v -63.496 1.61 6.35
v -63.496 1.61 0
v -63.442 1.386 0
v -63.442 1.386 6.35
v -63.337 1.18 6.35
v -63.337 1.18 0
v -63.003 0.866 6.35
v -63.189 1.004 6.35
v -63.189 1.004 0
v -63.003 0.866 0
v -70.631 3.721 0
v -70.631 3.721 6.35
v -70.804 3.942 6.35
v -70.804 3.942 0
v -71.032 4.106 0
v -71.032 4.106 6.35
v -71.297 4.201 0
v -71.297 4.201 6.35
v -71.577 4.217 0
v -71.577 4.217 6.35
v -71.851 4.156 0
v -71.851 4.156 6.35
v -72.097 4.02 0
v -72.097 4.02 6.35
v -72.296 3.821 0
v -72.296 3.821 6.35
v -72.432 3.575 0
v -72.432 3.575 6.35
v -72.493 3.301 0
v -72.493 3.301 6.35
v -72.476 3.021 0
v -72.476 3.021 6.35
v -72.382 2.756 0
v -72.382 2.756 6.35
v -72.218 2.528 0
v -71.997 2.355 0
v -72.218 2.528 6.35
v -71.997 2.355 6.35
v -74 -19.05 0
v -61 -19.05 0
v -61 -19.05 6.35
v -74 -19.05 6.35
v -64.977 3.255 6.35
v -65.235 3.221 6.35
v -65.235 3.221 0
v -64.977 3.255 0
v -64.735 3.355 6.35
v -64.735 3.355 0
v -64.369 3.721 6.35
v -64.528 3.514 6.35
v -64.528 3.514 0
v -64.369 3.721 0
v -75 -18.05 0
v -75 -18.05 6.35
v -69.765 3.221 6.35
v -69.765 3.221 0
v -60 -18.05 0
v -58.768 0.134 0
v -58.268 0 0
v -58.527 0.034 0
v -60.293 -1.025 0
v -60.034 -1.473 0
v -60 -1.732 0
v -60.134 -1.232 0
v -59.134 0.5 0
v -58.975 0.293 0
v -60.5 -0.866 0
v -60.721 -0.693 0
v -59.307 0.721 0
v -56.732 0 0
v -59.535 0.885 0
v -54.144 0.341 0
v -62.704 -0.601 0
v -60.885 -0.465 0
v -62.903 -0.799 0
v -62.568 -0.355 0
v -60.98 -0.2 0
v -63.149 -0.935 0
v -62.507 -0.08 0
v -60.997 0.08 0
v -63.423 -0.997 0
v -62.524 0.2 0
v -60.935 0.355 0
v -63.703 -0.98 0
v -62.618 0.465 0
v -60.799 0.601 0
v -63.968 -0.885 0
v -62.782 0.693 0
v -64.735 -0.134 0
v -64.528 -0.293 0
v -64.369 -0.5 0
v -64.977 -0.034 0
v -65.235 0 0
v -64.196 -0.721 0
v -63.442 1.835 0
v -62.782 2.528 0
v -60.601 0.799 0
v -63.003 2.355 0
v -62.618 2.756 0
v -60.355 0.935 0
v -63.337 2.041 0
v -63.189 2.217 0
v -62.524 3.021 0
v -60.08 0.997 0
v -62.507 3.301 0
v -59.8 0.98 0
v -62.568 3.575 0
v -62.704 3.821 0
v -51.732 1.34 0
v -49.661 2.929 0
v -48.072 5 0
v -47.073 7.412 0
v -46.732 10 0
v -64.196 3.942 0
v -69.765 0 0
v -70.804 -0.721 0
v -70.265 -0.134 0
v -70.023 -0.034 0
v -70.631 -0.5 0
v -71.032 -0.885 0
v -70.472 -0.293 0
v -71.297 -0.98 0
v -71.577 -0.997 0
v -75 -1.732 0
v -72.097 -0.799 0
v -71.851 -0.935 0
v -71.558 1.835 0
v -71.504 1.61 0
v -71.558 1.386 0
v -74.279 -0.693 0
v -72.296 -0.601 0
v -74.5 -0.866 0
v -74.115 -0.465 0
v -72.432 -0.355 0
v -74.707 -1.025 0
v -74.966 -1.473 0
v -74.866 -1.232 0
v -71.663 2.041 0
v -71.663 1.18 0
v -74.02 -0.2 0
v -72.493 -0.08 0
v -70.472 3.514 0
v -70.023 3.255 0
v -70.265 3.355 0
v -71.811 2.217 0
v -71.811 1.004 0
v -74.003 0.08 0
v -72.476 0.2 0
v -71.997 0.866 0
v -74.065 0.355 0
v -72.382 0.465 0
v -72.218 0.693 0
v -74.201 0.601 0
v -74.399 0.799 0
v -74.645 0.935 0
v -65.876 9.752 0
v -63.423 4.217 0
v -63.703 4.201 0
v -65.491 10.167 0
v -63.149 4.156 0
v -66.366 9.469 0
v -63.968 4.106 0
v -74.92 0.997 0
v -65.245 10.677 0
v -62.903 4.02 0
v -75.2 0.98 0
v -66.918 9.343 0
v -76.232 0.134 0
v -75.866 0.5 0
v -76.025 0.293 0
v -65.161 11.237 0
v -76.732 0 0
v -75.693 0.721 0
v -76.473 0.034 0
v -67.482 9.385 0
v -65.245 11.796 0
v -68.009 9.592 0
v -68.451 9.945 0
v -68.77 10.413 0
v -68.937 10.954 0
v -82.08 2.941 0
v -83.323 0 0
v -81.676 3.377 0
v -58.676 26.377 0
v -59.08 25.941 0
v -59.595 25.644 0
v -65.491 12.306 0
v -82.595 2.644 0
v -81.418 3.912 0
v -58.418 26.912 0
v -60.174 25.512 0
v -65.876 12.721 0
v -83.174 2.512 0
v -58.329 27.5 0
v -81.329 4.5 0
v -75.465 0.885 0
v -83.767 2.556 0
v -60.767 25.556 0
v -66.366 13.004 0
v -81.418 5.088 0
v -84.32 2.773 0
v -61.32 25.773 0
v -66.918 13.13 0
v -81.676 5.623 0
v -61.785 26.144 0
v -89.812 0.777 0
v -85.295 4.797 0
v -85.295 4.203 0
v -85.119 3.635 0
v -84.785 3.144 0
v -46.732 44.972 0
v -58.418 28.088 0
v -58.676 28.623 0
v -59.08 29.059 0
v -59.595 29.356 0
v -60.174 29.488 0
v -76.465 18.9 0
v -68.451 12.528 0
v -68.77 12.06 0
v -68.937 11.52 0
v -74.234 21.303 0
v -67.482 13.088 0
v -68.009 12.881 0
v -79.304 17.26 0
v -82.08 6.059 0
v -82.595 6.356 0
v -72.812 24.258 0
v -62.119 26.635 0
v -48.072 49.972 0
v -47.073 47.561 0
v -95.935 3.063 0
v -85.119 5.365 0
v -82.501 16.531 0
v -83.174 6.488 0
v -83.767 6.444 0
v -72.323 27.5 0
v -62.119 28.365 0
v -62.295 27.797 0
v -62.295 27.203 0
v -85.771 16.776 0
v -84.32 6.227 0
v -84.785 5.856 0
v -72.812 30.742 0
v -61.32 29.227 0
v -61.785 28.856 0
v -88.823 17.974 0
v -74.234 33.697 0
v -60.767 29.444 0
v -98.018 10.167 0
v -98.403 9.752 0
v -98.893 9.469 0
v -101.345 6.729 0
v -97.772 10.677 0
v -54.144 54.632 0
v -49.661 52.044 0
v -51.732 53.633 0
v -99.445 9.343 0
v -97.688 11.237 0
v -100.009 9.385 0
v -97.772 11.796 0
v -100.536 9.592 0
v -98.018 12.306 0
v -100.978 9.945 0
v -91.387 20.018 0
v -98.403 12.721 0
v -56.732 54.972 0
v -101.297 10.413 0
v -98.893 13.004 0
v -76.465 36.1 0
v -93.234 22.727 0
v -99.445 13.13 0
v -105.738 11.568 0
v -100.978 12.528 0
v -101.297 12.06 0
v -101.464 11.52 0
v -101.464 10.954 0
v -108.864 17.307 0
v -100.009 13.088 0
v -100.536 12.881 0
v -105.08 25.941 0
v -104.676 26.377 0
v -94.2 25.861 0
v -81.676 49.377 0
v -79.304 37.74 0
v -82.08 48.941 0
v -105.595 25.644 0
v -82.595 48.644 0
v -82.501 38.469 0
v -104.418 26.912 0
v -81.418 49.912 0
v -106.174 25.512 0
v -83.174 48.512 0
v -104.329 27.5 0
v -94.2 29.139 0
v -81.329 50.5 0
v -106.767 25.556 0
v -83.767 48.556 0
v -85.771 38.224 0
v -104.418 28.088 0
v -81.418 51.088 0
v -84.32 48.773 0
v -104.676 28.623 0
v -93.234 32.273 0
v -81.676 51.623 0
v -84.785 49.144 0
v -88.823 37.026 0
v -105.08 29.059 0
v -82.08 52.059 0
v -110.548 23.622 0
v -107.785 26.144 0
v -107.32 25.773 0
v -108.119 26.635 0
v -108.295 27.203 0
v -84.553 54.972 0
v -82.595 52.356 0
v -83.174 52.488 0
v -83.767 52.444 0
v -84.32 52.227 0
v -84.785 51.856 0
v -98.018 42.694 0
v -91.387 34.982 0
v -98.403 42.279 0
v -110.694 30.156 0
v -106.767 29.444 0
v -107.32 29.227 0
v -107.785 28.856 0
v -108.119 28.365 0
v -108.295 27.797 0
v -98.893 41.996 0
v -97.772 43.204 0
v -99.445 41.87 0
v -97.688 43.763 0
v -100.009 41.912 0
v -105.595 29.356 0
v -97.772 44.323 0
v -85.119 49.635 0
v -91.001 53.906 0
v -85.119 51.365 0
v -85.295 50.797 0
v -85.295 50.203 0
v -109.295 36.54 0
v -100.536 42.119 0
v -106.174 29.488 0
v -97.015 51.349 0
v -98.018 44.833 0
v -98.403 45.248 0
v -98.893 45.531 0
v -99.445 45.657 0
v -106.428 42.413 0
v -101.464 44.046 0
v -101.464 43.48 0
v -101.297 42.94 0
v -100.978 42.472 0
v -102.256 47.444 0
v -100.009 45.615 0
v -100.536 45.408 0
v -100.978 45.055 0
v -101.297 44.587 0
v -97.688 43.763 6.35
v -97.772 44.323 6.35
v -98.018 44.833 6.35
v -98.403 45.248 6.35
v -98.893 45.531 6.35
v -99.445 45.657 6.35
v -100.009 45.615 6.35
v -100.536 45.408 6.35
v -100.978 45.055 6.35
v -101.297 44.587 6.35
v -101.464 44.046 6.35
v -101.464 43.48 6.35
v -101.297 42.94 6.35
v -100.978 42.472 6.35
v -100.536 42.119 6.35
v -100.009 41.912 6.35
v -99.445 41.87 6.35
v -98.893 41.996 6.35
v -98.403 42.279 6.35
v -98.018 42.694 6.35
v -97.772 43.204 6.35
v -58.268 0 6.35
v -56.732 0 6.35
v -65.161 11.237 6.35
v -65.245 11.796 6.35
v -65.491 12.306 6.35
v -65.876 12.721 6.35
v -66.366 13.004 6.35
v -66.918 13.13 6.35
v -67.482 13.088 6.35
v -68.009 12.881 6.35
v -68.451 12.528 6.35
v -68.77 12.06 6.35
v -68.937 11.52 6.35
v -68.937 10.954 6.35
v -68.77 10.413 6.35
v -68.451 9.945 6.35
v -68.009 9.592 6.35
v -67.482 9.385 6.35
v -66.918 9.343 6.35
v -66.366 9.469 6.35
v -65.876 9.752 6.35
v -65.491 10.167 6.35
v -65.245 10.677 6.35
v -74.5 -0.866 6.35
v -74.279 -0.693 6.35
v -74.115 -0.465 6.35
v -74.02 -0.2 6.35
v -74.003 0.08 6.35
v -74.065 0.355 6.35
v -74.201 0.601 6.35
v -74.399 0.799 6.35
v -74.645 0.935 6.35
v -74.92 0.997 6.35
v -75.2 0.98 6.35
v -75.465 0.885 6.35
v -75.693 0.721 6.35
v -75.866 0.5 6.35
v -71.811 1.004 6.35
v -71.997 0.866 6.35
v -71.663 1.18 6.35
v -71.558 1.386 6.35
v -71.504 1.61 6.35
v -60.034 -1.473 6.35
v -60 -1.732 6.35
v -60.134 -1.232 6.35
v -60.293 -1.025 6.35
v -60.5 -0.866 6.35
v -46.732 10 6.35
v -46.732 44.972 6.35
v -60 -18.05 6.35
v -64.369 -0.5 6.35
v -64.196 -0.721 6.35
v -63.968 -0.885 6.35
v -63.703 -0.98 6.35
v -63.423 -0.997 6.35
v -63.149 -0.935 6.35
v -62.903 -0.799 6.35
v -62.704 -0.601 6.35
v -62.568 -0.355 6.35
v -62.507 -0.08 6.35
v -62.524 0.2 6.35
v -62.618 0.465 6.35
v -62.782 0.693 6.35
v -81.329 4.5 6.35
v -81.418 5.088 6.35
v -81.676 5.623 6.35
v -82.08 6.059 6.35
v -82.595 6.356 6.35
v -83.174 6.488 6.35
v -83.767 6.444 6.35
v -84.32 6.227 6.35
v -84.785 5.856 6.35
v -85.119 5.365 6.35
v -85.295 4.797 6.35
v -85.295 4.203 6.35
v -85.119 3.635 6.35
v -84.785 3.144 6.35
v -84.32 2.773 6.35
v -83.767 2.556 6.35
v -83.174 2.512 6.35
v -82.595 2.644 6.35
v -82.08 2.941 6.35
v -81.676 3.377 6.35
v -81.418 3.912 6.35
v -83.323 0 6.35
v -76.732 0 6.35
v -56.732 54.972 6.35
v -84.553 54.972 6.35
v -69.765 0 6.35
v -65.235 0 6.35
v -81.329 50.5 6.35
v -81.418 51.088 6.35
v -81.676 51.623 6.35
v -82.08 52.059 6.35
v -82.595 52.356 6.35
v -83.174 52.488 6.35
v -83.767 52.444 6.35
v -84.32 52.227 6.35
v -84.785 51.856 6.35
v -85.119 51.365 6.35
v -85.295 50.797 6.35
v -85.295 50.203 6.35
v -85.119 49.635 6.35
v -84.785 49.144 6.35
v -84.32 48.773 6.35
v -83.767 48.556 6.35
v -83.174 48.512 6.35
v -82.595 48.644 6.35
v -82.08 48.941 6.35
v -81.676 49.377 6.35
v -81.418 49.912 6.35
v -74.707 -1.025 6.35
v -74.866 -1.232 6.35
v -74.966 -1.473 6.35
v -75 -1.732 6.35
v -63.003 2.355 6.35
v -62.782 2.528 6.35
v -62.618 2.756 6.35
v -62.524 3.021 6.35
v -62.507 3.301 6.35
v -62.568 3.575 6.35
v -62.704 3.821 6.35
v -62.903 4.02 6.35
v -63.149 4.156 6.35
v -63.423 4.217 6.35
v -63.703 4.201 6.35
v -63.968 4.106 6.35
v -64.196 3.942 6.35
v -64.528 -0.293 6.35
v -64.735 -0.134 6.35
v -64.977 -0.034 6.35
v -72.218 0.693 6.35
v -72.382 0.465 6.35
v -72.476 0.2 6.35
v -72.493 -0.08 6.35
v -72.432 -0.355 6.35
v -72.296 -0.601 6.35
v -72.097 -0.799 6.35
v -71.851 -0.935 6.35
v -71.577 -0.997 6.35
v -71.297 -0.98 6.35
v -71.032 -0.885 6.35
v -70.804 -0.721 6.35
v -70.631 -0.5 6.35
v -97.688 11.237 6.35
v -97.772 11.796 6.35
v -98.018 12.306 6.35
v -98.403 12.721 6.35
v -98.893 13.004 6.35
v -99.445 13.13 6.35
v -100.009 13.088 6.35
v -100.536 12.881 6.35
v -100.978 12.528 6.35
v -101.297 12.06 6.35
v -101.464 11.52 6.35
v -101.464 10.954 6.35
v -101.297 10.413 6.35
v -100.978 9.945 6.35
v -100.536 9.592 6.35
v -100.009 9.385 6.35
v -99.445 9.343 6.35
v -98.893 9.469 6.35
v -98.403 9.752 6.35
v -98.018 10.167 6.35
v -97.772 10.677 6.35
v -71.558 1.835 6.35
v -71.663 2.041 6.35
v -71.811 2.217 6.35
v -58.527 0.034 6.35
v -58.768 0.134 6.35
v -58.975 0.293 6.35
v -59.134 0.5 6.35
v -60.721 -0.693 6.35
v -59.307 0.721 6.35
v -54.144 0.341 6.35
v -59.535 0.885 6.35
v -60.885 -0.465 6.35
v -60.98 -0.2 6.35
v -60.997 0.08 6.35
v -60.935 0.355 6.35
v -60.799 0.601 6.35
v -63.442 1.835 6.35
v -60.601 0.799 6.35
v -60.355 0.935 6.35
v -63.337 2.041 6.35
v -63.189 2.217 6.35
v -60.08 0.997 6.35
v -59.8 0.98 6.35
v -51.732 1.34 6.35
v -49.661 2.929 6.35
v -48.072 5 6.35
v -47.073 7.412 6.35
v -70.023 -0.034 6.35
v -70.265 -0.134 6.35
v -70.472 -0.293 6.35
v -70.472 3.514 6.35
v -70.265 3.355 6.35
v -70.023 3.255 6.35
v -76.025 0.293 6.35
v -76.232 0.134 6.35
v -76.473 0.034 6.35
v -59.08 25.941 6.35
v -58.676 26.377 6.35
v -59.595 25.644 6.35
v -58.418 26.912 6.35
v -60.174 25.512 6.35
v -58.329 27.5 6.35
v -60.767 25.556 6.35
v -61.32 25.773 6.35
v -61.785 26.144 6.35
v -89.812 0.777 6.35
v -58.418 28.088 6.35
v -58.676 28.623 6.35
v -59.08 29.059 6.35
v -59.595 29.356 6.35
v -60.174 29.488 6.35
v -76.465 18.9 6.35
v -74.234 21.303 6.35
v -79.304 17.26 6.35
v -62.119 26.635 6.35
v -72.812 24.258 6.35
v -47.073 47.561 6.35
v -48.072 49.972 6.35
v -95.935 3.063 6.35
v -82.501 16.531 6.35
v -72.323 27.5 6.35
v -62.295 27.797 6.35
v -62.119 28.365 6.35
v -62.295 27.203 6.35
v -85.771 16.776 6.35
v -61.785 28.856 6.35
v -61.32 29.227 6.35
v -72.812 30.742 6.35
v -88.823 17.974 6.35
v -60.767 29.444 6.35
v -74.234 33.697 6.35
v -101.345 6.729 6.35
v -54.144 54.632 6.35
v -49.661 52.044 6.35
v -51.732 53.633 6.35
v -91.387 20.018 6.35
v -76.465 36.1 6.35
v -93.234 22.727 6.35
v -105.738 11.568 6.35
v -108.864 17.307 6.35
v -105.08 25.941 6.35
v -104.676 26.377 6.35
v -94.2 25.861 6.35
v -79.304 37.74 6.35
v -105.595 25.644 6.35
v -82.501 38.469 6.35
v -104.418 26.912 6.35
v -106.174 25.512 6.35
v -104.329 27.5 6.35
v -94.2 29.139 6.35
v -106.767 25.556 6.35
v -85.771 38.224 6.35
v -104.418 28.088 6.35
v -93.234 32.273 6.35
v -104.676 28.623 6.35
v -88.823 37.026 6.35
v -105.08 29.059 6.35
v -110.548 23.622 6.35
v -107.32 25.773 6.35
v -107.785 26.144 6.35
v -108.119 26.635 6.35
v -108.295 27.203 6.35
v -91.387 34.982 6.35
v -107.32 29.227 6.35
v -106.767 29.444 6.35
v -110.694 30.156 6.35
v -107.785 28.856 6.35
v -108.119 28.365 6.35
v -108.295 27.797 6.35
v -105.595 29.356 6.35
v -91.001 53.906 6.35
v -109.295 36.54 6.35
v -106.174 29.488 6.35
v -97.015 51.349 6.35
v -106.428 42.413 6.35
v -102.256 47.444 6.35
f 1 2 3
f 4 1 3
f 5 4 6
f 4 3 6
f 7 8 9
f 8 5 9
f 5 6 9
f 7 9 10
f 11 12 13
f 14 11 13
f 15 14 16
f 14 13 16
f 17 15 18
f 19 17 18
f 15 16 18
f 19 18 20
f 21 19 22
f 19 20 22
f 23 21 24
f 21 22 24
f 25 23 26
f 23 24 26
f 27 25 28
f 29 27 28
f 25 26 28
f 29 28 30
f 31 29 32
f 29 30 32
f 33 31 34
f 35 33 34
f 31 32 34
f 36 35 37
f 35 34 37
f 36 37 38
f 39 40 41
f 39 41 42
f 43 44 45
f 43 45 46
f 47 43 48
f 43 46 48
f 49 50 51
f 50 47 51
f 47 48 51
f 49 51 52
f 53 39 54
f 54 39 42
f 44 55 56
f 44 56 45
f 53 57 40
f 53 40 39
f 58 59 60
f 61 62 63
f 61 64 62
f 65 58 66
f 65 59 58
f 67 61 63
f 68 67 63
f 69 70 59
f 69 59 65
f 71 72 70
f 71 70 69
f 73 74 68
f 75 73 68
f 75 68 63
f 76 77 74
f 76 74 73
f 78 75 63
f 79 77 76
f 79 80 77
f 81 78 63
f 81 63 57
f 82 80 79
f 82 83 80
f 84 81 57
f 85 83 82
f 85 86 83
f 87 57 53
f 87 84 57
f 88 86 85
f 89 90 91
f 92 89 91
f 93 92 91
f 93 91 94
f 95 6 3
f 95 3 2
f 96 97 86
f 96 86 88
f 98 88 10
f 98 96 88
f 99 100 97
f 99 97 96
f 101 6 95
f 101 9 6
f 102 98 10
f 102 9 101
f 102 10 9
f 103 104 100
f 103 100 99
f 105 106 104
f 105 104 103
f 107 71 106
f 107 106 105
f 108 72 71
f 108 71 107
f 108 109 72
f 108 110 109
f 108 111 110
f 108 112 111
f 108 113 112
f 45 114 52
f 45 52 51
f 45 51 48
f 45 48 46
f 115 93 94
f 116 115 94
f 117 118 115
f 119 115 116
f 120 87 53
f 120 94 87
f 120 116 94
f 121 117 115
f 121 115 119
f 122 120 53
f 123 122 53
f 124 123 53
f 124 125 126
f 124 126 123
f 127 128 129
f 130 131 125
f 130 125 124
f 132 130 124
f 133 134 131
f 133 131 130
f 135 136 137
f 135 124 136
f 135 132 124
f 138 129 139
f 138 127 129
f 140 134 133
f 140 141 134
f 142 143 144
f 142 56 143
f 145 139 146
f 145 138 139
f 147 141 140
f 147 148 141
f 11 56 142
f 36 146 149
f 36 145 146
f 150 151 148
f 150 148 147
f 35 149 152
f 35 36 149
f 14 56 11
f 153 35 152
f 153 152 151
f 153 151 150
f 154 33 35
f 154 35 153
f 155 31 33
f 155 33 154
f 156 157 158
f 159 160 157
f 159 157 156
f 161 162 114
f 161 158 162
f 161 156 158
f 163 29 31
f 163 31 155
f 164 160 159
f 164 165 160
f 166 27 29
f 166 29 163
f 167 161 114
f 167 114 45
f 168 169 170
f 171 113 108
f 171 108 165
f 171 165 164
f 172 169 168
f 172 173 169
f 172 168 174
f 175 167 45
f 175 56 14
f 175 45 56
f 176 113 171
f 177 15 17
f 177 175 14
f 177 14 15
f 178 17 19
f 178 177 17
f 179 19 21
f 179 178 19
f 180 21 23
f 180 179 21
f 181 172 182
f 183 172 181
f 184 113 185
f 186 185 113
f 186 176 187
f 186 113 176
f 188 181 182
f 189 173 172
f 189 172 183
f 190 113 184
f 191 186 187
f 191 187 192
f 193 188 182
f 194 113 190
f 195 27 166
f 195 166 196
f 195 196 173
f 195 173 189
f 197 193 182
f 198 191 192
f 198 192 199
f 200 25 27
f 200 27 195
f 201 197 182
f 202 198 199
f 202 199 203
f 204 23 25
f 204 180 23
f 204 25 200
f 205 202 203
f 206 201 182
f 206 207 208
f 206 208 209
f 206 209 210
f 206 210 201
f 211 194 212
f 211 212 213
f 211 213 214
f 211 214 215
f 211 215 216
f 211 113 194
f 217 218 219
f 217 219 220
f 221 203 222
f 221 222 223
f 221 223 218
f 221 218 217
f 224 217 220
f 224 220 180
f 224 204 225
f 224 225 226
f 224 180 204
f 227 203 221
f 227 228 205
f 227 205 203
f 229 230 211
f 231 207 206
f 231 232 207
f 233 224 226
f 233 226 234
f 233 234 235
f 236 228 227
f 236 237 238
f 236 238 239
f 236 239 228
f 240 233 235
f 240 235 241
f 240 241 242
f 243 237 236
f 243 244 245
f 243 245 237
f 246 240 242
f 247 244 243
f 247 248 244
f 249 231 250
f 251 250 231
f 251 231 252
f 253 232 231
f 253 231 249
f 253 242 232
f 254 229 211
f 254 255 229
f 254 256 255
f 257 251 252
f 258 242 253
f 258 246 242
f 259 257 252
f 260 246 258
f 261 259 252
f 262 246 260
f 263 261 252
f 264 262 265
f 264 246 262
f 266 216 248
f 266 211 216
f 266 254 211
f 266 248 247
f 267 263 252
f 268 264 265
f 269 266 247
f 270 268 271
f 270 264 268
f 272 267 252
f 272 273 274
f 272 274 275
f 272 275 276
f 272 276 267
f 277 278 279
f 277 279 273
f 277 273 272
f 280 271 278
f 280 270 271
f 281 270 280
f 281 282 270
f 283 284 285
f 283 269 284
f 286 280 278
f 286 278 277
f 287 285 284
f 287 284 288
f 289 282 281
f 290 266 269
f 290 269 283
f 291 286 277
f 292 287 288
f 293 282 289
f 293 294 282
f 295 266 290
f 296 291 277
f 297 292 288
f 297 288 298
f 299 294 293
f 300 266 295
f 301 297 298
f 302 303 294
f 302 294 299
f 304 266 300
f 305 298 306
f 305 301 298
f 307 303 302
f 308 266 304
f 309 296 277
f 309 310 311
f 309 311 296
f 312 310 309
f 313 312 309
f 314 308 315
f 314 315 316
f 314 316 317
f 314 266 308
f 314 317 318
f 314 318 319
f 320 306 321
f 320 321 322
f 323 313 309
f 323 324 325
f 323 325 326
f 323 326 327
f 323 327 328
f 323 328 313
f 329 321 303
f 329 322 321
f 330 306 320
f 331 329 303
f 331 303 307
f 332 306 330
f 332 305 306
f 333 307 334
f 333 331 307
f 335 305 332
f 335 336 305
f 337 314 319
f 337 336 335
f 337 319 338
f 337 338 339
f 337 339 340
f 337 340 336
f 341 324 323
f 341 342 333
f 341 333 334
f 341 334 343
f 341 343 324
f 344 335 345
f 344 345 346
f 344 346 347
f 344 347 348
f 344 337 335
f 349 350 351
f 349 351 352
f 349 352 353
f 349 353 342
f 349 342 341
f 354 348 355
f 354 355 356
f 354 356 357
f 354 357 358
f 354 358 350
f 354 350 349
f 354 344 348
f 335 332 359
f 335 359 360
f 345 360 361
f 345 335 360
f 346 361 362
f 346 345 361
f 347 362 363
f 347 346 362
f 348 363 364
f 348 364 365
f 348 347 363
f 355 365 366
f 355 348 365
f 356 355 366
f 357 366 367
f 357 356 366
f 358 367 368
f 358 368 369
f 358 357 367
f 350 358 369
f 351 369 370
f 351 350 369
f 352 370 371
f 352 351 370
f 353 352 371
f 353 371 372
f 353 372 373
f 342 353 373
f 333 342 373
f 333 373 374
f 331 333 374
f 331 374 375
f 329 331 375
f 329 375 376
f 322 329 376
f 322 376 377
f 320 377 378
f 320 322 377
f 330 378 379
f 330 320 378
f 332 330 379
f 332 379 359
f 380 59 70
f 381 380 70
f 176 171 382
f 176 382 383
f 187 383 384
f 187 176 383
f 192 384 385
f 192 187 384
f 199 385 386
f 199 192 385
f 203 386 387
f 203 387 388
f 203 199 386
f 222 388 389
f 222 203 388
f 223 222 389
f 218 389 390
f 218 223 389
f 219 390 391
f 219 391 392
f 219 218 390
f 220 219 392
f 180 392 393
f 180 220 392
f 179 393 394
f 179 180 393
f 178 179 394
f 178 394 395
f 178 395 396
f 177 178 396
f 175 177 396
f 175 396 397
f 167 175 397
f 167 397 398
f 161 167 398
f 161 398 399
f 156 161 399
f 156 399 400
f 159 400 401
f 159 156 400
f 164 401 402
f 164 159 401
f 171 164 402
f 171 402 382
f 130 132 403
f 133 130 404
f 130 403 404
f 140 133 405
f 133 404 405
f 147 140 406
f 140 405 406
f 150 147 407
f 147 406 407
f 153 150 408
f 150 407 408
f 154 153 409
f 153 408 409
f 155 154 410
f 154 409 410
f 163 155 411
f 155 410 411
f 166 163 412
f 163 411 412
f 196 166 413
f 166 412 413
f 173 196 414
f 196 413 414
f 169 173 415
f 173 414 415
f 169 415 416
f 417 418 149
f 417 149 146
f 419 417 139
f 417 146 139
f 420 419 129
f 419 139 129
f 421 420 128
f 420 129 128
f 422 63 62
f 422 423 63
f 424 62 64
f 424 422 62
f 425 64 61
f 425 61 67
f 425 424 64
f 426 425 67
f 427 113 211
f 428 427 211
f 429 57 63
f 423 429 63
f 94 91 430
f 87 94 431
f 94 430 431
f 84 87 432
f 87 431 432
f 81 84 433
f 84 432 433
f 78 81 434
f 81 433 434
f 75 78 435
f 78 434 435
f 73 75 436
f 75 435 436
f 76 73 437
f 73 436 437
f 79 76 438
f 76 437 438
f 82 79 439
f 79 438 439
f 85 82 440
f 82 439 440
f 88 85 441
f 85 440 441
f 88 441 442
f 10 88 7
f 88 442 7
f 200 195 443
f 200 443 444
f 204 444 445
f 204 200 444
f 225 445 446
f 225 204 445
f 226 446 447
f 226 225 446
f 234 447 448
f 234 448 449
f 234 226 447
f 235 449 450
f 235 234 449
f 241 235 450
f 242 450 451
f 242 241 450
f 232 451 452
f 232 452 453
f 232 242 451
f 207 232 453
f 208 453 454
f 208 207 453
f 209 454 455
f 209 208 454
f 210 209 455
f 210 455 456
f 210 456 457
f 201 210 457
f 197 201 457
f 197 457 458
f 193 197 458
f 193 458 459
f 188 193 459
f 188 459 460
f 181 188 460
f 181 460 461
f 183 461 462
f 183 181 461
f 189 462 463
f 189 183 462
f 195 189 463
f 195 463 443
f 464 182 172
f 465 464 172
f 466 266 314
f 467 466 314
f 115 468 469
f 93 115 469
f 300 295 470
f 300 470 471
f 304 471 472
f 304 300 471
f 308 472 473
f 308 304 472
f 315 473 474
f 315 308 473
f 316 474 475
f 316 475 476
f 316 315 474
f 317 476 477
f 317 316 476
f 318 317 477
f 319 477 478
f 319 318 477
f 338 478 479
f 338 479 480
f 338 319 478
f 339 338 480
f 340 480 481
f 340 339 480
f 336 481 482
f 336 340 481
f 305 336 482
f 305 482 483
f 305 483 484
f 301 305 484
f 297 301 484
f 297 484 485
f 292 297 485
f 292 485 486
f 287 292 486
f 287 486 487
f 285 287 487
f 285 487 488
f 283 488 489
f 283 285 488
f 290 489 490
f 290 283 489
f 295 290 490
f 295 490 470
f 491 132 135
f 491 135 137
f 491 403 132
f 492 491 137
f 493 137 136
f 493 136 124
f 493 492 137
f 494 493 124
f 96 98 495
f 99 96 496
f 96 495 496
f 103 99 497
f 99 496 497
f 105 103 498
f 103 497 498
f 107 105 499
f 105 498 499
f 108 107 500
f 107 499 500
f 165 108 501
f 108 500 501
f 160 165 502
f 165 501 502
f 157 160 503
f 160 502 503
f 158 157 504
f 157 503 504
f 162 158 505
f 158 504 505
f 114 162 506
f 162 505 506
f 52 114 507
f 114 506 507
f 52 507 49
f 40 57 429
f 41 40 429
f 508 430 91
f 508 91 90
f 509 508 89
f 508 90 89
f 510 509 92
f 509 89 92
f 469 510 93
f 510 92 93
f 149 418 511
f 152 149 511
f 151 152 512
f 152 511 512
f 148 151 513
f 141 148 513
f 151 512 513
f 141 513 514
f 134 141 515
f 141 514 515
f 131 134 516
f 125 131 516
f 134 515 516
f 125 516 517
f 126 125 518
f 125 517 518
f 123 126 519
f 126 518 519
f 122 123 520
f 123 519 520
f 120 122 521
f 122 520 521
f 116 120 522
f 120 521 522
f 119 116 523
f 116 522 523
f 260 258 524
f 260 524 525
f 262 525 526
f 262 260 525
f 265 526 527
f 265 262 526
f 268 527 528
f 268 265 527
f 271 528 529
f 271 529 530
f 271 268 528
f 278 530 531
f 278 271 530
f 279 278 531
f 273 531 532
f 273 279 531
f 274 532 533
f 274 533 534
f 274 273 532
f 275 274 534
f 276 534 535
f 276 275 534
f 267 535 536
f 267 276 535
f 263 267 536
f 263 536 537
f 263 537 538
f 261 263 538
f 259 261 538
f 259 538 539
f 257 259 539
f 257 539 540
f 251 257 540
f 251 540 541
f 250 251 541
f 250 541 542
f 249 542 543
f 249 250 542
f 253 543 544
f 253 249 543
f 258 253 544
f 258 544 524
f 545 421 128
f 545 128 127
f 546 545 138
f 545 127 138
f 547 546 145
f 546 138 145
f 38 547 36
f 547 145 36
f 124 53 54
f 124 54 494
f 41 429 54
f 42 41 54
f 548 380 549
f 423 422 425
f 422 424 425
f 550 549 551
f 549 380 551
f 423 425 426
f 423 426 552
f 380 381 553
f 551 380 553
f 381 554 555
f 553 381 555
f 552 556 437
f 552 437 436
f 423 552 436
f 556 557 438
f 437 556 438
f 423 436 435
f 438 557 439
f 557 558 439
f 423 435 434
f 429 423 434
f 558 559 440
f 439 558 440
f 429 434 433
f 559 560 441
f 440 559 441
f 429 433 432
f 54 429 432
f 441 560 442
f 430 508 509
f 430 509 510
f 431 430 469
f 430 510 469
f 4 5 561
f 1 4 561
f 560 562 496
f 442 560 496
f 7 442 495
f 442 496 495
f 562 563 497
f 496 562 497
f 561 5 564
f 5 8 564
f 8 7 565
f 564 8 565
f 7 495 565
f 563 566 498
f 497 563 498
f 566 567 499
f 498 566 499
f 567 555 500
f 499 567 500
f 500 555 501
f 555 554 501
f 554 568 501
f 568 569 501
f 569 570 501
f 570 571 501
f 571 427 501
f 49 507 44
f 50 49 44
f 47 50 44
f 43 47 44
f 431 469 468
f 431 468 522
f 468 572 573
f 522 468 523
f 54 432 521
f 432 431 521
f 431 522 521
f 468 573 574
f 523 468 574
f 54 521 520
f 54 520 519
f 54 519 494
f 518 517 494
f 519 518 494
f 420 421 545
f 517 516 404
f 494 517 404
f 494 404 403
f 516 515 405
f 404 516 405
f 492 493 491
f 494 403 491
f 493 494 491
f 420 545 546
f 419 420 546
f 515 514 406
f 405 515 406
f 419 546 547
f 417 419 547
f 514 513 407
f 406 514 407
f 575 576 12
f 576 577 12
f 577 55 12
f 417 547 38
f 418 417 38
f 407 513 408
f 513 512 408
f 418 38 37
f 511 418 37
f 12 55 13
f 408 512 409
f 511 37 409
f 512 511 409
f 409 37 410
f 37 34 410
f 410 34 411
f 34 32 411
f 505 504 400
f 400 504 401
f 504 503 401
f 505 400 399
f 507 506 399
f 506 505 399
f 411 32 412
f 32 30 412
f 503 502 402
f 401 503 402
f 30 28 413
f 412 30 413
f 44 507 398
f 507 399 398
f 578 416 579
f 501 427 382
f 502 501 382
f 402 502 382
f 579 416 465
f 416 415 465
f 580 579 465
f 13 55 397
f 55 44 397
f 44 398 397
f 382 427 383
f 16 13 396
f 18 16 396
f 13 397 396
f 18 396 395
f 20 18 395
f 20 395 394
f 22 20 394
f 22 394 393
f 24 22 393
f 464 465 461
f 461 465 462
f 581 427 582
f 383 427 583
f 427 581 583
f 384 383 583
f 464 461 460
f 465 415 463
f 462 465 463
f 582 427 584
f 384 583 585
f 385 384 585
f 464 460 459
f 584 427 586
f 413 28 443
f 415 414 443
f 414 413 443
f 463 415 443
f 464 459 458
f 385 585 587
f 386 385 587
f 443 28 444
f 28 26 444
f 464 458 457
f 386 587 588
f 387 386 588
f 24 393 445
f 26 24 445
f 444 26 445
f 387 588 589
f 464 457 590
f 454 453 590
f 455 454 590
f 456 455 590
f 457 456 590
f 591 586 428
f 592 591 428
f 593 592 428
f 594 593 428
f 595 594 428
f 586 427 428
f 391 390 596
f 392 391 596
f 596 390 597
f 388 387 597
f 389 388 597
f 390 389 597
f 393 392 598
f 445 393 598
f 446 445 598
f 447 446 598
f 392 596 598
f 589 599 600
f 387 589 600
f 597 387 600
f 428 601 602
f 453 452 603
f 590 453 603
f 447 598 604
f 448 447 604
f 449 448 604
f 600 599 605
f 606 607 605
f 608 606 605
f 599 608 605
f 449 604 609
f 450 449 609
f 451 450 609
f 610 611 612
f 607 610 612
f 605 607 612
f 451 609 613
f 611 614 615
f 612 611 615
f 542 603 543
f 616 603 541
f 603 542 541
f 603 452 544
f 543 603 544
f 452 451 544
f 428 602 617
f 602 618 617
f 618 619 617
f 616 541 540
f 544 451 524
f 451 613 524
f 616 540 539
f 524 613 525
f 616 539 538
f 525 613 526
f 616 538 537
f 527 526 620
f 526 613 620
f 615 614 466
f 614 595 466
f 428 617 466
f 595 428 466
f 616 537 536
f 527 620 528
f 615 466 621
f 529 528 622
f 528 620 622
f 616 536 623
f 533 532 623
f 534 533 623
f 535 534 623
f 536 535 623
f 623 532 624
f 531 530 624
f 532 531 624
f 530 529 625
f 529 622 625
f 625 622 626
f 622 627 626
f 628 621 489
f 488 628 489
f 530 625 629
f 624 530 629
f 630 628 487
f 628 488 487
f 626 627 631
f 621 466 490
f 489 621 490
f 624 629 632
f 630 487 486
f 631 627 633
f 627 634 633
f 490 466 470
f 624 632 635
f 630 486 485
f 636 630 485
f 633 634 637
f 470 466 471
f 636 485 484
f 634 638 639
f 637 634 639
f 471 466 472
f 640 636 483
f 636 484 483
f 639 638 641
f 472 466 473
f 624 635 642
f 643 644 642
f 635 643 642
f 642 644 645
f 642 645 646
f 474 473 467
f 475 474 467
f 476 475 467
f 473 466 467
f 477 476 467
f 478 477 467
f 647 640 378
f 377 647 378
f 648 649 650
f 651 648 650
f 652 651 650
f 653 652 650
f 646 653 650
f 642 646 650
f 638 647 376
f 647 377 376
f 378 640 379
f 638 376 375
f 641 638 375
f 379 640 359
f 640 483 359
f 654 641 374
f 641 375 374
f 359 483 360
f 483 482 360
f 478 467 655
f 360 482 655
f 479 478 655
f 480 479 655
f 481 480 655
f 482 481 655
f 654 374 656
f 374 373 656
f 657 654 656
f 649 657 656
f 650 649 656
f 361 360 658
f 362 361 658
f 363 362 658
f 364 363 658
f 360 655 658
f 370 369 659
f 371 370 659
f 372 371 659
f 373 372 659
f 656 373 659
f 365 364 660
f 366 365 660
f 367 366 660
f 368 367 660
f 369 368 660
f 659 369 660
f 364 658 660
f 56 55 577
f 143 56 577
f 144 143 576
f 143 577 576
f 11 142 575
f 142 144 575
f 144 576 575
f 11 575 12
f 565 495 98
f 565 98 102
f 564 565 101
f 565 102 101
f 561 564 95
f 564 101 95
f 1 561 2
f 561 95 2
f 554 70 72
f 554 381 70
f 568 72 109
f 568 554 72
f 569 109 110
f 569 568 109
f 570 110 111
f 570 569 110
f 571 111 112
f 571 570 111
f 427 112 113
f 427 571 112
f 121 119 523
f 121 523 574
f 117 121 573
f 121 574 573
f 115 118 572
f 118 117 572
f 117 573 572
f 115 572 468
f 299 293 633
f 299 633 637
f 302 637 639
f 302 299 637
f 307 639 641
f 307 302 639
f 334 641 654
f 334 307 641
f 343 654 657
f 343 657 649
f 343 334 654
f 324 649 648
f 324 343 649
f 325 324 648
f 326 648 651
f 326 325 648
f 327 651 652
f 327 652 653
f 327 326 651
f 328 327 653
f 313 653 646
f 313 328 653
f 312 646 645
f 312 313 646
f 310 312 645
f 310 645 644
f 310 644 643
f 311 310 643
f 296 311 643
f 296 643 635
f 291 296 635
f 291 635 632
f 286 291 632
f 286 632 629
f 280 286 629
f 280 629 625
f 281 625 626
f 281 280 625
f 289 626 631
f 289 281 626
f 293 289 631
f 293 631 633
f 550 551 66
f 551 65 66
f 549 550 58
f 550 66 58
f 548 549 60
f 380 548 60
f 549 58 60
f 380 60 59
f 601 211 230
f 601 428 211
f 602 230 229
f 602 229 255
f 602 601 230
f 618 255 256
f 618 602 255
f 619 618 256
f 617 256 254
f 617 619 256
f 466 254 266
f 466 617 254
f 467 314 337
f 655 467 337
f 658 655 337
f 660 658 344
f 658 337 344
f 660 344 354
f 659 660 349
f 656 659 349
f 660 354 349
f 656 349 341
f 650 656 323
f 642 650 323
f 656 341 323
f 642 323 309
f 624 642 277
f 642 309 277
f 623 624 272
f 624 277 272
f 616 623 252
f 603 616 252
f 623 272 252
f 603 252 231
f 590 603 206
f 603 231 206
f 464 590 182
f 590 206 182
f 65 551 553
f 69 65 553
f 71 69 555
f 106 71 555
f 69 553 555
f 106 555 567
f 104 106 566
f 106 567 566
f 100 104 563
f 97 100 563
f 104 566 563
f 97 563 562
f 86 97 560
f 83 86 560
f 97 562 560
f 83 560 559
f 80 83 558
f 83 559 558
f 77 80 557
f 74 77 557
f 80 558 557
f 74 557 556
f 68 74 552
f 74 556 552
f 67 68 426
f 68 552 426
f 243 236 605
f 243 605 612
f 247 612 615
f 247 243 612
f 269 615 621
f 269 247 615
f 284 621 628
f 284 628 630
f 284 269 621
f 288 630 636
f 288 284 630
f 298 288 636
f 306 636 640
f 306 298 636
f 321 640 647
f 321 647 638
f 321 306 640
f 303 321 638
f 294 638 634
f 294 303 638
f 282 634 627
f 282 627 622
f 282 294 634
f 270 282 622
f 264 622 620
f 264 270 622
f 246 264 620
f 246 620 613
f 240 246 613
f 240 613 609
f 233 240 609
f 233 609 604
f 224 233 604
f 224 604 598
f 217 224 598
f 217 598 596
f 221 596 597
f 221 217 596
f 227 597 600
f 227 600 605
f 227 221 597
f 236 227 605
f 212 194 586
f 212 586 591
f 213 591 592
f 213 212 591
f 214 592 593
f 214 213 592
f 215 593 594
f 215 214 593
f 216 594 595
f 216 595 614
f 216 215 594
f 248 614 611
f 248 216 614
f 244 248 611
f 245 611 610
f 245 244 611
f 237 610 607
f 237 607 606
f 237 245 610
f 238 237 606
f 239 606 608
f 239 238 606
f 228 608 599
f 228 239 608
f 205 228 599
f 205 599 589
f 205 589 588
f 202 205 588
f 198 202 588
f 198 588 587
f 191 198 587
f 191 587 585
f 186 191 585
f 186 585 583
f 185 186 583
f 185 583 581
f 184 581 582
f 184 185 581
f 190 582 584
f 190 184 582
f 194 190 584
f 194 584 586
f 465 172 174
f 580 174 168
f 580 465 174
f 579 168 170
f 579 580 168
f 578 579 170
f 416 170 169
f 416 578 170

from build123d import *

# Parameters (mm, degrees)
SKETCH1_R           = 11
SKETCH1_R_2         = 1.89865
SKETCH1_R_3         = 1.9939
BOSS_EXTRUDE1_DEPTH = 6.35
FILLET1_R           = 10
SKETCH2_W           = 15
SKETCH2_H           = 19.05
BOSS_EXTRUDE2_DEPTH = 6.35
CHAMFER1_SIZE       = 1
SKETCH3_R           = 1
CUT_EXTRUDE1_DEPTH  = 159.045298363
SKETCH4_W           = 7.99338
SKETCH4_H           = 3.22072
CUT_EXTRUDE2_DEPTH  = 159.045298363
FILLET3_R           = 1
CUT_EXTRUDE3_DEPTH  = 159.045298363
FILLET4_R           = 10
SKETCH9_R           = 1
CUT_EXTRUDE4_DEPTH  = 124.871065449
FILLET5_R           = 1


with BuildPart() as part:
    # Sketch1 → Boss-Extrude1 (new body)
    with BuildSketch(Plane.XY):
        with BuildLine():
            Line((-40.498784978, 0), (0, 0))
            Line((0, 0), (0, 75))
            ThreePointArc((0, 75), (-37.5, 112.5), (-75, 75))
            Line((-75, 75), (-75, 55))
            Line((-75, 55), (-83.323029145, 55))
            ThreePointArc((-83.323029145, 55), (-110.823029145, 27.5), (-83.323029145, 0))
            Line((-83.323029145, 0), (-40.498784978, 0))
        make_face()
        with Locations((-83.323029145, 27.5)):
            Circle(SKETCH1_R, mode=Mode.SUBTRACT)
        with Locations((-67.059573177, 11.236544033)):
            Circle(SKETCH1_R_2, mode=Mode.SUBTRACT)
        with Locations((-83.323029145, 50.5)):
            Circle(SKETCH1_R_3, mode=Mode.SUBTRACT)
        with Locations((-99.586485112, 11.236544033)):
            Circle(SKETCH1_R_2, mode=Mode.SUBTRACT)
        with Locations((-60.323029145, 27.5)):
            Circle(SKETCH1_R_3, mode=Mode.SUBTRACT)
        with Locations((-99.586485112, 43.763455967)):
            Circle(SKETCH1_R_2, mode=Mode.SUBTRACT)
        with Locations((-83.323029145, 4.5)):
            Circle(SKETCH1_R_3, mode=Mode.SUBTRACT)
        with Locations((-106.323029145, 27.5)):
            Circle(SKETCH1_R_3, mode=Mode.SUBTRACT)
    extrude(amount=BOSS_EXTRUDE1_DEPTH)

    # Fillet1
    fillet1_edges = [part.edges().sort_by_distance(p)[0] for p in [
        (-75, 55, 3.175),
    ]]
    fillet(fillet1_edges, radius=FILLET1_R)

    # Sketch2 → Boss-Extrude2 (add)
    with BuildSketch(Plane(origin=(0, 0, 0), x_dir=(-1, 0, 0), z_dir=(0, 0, -1))):
        with Locations((7.5, -9.525)):
            Rectangle(SKETCH2_W, SKETCH2_H)
        with Locations((37.5, -9.525)):
            Rectangle(SKETCH2_W, SKETCH2_H)
        with Locations((67.5, -9.525)):
            Rectangle(SKETCH2_W, SKETCH2_H)
    extrude(amount=-BOSS_EXTRUDE2_DEPTH)

    # Chamfer1
    chamfer1_edges = [part.edges().sort_by_distance(p)[0] for p in [
        (0, -19.05, 3.175),
        (-15, -19.05, 3.175),
        (-30, -19.05, 3.175),
        (-45, -19.05, 3.175),
        (-60, -19.05, 3.175),
        (-75, -19.05, 3.175),
    ]]
    chamfer(chamfer1_edges, length=CHAMFER1_SIZE)

    # Sketch3 → Cut-Extrude1 (cut, through all)
    with BuildSketch(Plane.XY.offset(6.35)):
        with Locations((-75, 0)):
            Circle(SKETCH3_R)
        with Locations((-60, 0)):
            Circle(SKETCH3_R)
        with Locations((-45, 0)):
            Circle(SKETCH3_R)
        with Locations((-30, 0)):
            Circle(SKETCH3_R)
        with Locations((-15, 0)):
            Circle(SKETCH3_R)
    extrude(amount=-CUT_EXTRUDE1_DEPTH, mode=Mode.SUBTRACT)

    # Sketch4 → Cut-Extrude2 (cut, through all)
    with BuildSketch(Plane.XY.offset(6.35)):
        with Locations((-67.5, 1.61036)):
            Rectangle(SKETCH4_W, SKETCH4_H)
    extrude(amount=-CUT_EXTRUDE2_DEPTH, mode=Mode.SUBTRACT)

    # Fillet3
    fillet3_edges = [part.edges().sort_by_distance(p)[0] for p in [
        (-75, -1, 3.175),
        (-76, 0, 3.175),
        (-60, -1, 3.175),
        (-59, 0, 3.175),
        (-45, -1, 3.175),
        (-46, 0, 3.175),
        (-30, -1, 3.175),
        (-29, 0, 3.175),
        (-15, -1, 3.175),
        (-16, 0, 3.175),
    ]]
    fillet(fillet3_edges, radius=FILLET3_R)

    # Sketch5 → Cut-Extrude3 (cut, through all)
    with BuildSketch(Plane(origin=(0, 0, 0), x_dir=(-1, 0, 0), z_dir=(0, 0, -1))):
        Polygon((46.732050808, 0), (46.732050808, 54.972488867), (84.552807772, 54.972488867), (84.552807772, 112.5), (0, 112.5), (0, -19.05), (46.732050808, -19.05), align=None)
    extrude(amount=-CUT_EXTRUDE3_DEPTH, mode=Mode.SUBTRACT)

    # Fillet4
    fillet4_edges = [part.edges().sort_by_distance(p)[0] for p in [
        (-46.732050808, 0, 3.175),
        (-46.732050808, 54.972488867, 3.175),
    ]]
    fillet(fillet4_edges, radius=FILLET4_R)

    # Sketch9 → Cut-Extrude4 (cut, through all)
    with BuildSketch(Plane.XY.offset(6.35)):
        with Locations((-71.49669, 3.22072)):
            Circle(SKETCH9_R)
        with Locations((-63.50331, 3.22072)):
            Circle(SKETCH9_R)
        with Locations((-63.50331, 0)):
            Circle(SKETCH9_R)
        with Locations((-71.49669, 0)):
            Circle(SKETCH9_R)
    extrude(amount=-CUT_EXTRUDE4_DEPTH, mode=Mode.SUBTRACT)

    # Fillet5
    # the kernel refuses this fillet: 1 mm, written as the material it takes off along each edge
    with BuildSketch(Plane(origin=(-64.50331, 3.22072, -1.830127019), x_dir=(0.2588190451025049, 0.9659258262890725, 0), z_dir=(0, 0, 1)), Plane(origin=(-63.50331, 1, -1.830127019), x_dir=(0.9659258262890688, -0.25881904510251885, 0), z_dir=(0, 0, 1)), Plane(origin=(-71.49669, 2.22072, -1.830127019), x_dir=(-0.9659258262890682, 0.25881904510252124, 0), z_dir=(0, 0, 1))) as fillet5_piece_1:
        with BuildLine():
            CenterArc((0.776457135, 0.965925826), FILLET5_R, 195, 60)
            Line((-0.189468691, 0.707106781), (0, 0))
            ThreePointArc((0, 0), (0.258819045, 0.034074174), (0.51763809, 0))
        make_face()
    extrude(amount=10.010254038, mode=Mode.SUBTRACT)
    with BuildSketch(Plane(origin=(-63.50331, 2.22072, -1.830127019), x_dir=(0, -1, 0), z_dir=(0, 0, 1)), Plane(origin=(-71.49669, 1, -1.830127019), x_dir=(0, 1, 0), z_dir=(0, 0, 1))) as fillet5_piece_2:
        with BuildLine():
            CenterArc((0.732050808, 1), FILLET5_R, 210, 60)
            ThreePointArc((-0.133974596, 0.5), (-0.034074174, 0.258819045), (0, 0))
            Line((0, 0), (0.732050808, 0))
        make_face()
    extrude(amount=10.010254038, mode=Mode.SUBTRACT)
    with BuildSketch(Plane(origin=(-64.50331, 0, -1.830127019), x_dir=(0.2588190451025049, -0.9659258262890725, 0), z_dir=(0, 0, 1)), Plane(origin=(-70.49669, 0, 8.180127019), x_dir=(-0.25881904510253045, -0.9659258262890658, 0), z_dir=(0, 0, -1))) as fillet5_piece_3:
        with BuildLine():
            CenterArc((0.776457135, -0.965925826), FILLET5_R, 105, 60)
            Line((-0.189468691, -0.707106781), (0, 0))
            ThreePointArc((0, 0), (0.258819045, -0.034074174), (0.51763809, 0))
        make_face()
    extrude(amount=10.010254038, mode=Mode.SUBTRACT)
    with BuildSketch(Plane(origin=(-70.49669, 3.22072, 8.180127019), x_dir=(1, 0, 0), z_dir=(0, 0, -1))) as fillet5_piece_4:
        with BuildLine():
            CenterArc((0.732050808, -1), FILLET5_R, 90, 60)
            ThreePointArc((-0.133974596, -0.5), (-0.034074174, -0.258819045), (0, 0))
            Line((0, 0), (0.732050808, 0))
        make_face()
    extrude(amount=10.010254038, mode=Mode.SUBTRACT)


solid = part.part
